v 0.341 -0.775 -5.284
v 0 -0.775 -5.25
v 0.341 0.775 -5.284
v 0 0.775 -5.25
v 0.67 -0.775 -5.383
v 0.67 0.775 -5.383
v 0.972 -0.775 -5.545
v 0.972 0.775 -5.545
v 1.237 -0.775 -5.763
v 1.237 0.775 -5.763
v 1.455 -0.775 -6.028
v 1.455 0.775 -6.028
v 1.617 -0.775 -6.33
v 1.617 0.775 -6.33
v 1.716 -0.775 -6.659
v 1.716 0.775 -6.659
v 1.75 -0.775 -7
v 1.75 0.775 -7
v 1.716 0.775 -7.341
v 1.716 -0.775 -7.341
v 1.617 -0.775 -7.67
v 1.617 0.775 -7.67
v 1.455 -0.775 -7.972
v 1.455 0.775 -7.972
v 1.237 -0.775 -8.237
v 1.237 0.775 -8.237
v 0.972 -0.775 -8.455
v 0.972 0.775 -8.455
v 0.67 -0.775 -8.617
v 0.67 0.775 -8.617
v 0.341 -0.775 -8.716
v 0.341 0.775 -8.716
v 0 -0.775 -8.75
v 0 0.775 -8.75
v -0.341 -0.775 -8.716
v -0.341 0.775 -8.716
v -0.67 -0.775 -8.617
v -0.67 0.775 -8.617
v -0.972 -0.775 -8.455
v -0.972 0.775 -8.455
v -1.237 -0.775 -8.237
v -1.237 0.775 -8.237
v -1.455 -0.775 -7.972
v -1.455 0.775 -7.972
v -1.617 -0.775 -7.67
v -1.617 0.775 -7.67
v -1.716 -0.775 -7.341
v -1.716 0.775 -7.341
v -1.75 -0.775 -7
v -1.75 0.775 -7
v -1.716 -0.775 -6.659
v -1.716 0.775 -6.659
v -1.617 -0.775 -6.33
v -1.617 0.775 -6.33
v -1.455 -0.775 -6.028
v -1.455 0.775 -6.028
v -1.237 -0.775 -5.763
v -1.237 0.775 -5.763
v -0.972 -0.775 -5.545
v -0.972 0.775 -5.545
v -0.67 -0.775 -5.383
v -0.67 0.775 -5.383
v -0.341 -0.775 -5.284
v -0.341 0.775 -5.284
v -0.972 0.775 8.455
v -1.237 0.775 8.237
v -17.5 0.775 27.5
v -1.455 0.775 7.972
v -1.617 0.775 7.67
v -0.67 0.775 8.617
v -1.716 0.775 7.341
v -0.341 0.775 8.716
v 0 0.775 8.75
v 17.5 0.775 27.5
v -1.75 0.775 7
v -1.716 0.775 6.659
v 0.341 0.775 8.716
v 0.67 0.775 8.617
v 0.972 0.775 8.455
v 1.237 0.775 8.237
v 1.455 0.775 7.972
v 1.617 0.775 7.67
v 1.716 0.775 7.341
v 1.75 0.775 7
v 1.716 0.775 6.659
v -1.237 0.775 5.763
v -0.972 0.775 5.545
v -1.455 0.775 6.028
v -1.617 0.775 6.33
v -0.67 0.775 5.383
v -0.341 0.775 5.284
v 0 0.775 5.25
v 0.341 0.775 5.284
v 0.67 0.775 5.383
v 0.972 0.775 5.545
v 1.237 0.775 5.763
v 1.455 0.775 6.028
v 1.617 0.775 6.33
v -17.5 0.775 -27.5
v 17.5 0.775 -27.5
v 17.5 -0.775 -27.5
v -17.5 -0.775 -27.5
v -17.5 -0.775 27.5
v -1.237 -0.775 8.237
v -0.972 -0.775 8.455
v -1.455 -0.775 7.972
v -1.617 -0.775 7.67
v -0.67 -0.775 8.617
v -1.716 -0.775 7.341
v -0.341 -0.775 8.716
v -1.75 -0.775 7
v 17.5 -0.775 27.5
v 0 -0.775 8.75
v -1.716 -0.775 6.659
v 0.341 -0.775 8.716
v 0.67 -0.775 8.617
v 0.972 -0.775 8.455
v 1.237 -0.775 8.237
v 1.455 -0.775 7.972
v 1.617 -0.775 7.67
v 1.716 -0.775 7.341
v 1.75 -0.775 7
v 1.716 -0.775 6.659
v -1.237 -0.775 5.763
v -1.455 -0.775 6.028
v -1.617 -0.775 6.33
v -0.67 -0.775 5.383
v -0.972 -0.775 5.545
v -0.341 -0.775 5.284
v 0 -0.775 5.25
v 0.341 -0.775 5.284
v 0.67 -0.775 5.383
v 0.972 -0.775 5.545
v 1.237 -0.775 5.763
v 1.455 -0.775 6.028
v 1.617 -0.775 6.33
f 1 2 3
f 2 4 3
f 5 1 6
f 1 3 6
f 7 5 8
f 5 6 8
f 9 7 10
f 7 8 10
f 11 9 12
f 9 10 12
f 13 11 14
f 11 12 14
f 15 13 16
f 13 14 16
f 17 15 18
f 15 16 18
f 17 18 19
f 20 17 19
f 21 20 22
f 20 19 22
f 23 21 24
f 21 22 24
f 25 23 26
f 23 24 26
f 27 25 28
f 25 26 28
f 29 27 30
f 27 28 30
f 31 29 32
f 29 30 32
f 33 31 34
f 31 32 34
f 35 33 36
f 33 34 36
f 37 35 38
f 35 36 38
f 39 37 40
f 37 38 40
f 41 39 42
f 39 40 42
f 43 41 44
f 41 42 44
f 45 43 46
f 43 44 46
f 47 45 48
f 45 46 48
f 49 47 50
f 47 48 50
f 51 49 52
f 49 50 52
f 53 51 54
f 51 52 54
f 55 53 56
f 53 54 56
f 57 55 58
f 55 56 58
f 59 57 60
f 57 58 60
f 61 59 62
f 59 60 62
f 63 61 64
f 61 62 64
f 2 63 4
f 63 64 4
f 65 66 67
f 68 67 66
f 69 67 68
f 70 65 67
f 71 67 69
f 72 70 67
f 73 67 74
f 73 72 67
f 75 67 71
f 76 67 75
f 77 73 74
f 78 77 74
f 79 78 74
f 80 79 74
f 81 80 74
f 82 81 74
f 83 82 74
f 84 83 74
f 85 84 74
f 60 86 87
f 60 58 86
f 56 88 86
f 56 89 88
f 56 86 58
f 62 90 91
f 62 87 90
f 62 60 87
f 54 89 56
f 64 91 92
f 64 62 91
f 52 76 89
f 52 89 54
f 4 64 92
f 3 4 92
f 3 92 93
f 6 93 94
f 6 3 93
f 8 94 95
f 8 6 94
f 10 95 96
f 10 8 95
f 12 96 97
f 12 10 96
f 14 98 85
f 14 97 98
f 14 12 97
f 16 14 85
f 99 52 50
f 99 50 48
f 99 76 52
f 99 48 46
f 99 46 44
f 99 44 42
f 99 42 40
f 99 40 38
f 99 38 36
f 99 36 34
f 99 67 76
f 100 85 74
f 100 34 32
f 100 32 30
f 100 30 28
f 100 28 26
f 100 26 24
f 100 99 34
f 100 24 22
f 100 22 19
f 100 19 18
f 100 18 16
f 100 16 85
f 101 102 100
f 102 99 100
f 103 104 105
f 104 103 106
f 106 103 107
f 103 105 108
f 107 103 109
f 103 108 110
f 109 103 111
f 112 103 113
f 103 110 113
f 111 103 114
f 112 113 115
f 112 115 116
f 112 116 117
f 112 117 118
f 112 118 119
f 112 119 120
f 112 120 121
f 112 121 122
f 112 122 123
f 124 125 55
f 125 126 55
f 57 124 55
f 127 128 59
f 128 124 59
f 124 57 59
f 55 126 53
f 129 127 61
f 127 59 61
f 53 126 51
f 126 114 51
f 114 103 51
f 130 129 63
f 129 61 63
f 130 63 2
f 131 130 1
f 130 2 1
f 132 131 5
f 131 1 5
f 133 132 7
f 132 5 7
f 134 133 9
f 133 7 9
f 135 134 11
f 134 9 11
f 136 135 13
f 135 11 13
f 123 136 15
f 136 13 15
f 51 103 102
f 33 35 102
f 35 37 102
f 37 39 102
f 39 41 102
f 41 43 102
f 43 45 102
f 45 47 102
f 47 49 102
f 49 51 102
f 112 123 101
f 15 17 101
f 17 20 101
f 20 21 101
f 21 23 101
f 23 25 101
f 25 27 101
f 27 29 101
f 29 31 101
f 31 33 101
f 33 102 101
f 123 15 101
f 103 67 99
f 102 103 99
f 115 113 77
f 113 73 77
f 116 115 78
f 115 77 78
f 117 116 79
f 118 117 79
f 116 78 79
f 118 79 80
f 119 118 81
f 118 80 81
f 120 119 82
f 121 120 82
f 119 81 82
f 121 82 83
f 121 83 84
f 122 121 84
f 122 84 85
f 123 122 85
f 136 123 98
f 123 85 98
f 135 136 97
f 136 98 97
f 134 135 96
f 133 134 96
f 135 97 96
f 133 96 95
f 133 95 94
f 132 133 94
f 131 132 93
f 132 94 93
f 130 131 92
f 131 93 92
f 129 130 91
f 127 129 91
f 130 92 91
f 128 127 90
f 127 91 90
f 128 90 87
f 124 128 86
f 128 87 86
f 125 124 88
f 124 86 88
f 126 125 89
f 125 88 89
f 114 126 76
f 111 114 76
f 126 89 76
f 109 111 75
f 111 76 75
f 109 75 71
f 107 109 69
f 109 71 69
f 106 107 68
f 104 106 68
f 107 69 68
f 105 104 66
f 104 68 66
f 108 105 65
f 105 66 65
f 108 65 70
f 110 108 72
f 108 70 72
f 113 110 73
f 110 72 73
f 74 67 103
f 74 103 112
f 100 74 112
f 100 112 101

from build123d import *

# Parameters (mm, degrees)
SKETCH1_W           = 35
SKETCH1_H           = 55
BOSS_EXTRUDE1_DEPTH = 0.775
SKETCH2_R           = 1.75
CUT_EXTRUDE1_DEPTH  = 5


with BuildPart() as part:
    # Sketch1 → Boss-Extrude1 (new, symmetric)
    with BuildSketch(Plane(origin=(0, 0, 0), x_dir=(1, 0, 0), z_dir=(0, 1, 0))):
        Rectangle(SKETCH1_W, SKETCH1_H)
    extrude(amount=BOSS_EXTRUDE1_DEPTH, both=True)

    # Sketch2 → Cut-Extrude1 (cut, symmetric)
    with BuildSketch(Plane(origin=(0, 0, 0), x_dir=(1, 0, 0), z_dir=(0, 1, 0))):
        with Locations(Location((0, 7, 0), (0, 0, 270))):
            Circle(SKETCH2_R)
        with Locations(Location((0, -7, 0), (0, 0, 270))):
            Circle(SKETCH2_R)
    extrude(amount=CUT_EXTRUDE1_DEPTH, both=True, mode=Mode.SUBTRACT)


solid = part.part
